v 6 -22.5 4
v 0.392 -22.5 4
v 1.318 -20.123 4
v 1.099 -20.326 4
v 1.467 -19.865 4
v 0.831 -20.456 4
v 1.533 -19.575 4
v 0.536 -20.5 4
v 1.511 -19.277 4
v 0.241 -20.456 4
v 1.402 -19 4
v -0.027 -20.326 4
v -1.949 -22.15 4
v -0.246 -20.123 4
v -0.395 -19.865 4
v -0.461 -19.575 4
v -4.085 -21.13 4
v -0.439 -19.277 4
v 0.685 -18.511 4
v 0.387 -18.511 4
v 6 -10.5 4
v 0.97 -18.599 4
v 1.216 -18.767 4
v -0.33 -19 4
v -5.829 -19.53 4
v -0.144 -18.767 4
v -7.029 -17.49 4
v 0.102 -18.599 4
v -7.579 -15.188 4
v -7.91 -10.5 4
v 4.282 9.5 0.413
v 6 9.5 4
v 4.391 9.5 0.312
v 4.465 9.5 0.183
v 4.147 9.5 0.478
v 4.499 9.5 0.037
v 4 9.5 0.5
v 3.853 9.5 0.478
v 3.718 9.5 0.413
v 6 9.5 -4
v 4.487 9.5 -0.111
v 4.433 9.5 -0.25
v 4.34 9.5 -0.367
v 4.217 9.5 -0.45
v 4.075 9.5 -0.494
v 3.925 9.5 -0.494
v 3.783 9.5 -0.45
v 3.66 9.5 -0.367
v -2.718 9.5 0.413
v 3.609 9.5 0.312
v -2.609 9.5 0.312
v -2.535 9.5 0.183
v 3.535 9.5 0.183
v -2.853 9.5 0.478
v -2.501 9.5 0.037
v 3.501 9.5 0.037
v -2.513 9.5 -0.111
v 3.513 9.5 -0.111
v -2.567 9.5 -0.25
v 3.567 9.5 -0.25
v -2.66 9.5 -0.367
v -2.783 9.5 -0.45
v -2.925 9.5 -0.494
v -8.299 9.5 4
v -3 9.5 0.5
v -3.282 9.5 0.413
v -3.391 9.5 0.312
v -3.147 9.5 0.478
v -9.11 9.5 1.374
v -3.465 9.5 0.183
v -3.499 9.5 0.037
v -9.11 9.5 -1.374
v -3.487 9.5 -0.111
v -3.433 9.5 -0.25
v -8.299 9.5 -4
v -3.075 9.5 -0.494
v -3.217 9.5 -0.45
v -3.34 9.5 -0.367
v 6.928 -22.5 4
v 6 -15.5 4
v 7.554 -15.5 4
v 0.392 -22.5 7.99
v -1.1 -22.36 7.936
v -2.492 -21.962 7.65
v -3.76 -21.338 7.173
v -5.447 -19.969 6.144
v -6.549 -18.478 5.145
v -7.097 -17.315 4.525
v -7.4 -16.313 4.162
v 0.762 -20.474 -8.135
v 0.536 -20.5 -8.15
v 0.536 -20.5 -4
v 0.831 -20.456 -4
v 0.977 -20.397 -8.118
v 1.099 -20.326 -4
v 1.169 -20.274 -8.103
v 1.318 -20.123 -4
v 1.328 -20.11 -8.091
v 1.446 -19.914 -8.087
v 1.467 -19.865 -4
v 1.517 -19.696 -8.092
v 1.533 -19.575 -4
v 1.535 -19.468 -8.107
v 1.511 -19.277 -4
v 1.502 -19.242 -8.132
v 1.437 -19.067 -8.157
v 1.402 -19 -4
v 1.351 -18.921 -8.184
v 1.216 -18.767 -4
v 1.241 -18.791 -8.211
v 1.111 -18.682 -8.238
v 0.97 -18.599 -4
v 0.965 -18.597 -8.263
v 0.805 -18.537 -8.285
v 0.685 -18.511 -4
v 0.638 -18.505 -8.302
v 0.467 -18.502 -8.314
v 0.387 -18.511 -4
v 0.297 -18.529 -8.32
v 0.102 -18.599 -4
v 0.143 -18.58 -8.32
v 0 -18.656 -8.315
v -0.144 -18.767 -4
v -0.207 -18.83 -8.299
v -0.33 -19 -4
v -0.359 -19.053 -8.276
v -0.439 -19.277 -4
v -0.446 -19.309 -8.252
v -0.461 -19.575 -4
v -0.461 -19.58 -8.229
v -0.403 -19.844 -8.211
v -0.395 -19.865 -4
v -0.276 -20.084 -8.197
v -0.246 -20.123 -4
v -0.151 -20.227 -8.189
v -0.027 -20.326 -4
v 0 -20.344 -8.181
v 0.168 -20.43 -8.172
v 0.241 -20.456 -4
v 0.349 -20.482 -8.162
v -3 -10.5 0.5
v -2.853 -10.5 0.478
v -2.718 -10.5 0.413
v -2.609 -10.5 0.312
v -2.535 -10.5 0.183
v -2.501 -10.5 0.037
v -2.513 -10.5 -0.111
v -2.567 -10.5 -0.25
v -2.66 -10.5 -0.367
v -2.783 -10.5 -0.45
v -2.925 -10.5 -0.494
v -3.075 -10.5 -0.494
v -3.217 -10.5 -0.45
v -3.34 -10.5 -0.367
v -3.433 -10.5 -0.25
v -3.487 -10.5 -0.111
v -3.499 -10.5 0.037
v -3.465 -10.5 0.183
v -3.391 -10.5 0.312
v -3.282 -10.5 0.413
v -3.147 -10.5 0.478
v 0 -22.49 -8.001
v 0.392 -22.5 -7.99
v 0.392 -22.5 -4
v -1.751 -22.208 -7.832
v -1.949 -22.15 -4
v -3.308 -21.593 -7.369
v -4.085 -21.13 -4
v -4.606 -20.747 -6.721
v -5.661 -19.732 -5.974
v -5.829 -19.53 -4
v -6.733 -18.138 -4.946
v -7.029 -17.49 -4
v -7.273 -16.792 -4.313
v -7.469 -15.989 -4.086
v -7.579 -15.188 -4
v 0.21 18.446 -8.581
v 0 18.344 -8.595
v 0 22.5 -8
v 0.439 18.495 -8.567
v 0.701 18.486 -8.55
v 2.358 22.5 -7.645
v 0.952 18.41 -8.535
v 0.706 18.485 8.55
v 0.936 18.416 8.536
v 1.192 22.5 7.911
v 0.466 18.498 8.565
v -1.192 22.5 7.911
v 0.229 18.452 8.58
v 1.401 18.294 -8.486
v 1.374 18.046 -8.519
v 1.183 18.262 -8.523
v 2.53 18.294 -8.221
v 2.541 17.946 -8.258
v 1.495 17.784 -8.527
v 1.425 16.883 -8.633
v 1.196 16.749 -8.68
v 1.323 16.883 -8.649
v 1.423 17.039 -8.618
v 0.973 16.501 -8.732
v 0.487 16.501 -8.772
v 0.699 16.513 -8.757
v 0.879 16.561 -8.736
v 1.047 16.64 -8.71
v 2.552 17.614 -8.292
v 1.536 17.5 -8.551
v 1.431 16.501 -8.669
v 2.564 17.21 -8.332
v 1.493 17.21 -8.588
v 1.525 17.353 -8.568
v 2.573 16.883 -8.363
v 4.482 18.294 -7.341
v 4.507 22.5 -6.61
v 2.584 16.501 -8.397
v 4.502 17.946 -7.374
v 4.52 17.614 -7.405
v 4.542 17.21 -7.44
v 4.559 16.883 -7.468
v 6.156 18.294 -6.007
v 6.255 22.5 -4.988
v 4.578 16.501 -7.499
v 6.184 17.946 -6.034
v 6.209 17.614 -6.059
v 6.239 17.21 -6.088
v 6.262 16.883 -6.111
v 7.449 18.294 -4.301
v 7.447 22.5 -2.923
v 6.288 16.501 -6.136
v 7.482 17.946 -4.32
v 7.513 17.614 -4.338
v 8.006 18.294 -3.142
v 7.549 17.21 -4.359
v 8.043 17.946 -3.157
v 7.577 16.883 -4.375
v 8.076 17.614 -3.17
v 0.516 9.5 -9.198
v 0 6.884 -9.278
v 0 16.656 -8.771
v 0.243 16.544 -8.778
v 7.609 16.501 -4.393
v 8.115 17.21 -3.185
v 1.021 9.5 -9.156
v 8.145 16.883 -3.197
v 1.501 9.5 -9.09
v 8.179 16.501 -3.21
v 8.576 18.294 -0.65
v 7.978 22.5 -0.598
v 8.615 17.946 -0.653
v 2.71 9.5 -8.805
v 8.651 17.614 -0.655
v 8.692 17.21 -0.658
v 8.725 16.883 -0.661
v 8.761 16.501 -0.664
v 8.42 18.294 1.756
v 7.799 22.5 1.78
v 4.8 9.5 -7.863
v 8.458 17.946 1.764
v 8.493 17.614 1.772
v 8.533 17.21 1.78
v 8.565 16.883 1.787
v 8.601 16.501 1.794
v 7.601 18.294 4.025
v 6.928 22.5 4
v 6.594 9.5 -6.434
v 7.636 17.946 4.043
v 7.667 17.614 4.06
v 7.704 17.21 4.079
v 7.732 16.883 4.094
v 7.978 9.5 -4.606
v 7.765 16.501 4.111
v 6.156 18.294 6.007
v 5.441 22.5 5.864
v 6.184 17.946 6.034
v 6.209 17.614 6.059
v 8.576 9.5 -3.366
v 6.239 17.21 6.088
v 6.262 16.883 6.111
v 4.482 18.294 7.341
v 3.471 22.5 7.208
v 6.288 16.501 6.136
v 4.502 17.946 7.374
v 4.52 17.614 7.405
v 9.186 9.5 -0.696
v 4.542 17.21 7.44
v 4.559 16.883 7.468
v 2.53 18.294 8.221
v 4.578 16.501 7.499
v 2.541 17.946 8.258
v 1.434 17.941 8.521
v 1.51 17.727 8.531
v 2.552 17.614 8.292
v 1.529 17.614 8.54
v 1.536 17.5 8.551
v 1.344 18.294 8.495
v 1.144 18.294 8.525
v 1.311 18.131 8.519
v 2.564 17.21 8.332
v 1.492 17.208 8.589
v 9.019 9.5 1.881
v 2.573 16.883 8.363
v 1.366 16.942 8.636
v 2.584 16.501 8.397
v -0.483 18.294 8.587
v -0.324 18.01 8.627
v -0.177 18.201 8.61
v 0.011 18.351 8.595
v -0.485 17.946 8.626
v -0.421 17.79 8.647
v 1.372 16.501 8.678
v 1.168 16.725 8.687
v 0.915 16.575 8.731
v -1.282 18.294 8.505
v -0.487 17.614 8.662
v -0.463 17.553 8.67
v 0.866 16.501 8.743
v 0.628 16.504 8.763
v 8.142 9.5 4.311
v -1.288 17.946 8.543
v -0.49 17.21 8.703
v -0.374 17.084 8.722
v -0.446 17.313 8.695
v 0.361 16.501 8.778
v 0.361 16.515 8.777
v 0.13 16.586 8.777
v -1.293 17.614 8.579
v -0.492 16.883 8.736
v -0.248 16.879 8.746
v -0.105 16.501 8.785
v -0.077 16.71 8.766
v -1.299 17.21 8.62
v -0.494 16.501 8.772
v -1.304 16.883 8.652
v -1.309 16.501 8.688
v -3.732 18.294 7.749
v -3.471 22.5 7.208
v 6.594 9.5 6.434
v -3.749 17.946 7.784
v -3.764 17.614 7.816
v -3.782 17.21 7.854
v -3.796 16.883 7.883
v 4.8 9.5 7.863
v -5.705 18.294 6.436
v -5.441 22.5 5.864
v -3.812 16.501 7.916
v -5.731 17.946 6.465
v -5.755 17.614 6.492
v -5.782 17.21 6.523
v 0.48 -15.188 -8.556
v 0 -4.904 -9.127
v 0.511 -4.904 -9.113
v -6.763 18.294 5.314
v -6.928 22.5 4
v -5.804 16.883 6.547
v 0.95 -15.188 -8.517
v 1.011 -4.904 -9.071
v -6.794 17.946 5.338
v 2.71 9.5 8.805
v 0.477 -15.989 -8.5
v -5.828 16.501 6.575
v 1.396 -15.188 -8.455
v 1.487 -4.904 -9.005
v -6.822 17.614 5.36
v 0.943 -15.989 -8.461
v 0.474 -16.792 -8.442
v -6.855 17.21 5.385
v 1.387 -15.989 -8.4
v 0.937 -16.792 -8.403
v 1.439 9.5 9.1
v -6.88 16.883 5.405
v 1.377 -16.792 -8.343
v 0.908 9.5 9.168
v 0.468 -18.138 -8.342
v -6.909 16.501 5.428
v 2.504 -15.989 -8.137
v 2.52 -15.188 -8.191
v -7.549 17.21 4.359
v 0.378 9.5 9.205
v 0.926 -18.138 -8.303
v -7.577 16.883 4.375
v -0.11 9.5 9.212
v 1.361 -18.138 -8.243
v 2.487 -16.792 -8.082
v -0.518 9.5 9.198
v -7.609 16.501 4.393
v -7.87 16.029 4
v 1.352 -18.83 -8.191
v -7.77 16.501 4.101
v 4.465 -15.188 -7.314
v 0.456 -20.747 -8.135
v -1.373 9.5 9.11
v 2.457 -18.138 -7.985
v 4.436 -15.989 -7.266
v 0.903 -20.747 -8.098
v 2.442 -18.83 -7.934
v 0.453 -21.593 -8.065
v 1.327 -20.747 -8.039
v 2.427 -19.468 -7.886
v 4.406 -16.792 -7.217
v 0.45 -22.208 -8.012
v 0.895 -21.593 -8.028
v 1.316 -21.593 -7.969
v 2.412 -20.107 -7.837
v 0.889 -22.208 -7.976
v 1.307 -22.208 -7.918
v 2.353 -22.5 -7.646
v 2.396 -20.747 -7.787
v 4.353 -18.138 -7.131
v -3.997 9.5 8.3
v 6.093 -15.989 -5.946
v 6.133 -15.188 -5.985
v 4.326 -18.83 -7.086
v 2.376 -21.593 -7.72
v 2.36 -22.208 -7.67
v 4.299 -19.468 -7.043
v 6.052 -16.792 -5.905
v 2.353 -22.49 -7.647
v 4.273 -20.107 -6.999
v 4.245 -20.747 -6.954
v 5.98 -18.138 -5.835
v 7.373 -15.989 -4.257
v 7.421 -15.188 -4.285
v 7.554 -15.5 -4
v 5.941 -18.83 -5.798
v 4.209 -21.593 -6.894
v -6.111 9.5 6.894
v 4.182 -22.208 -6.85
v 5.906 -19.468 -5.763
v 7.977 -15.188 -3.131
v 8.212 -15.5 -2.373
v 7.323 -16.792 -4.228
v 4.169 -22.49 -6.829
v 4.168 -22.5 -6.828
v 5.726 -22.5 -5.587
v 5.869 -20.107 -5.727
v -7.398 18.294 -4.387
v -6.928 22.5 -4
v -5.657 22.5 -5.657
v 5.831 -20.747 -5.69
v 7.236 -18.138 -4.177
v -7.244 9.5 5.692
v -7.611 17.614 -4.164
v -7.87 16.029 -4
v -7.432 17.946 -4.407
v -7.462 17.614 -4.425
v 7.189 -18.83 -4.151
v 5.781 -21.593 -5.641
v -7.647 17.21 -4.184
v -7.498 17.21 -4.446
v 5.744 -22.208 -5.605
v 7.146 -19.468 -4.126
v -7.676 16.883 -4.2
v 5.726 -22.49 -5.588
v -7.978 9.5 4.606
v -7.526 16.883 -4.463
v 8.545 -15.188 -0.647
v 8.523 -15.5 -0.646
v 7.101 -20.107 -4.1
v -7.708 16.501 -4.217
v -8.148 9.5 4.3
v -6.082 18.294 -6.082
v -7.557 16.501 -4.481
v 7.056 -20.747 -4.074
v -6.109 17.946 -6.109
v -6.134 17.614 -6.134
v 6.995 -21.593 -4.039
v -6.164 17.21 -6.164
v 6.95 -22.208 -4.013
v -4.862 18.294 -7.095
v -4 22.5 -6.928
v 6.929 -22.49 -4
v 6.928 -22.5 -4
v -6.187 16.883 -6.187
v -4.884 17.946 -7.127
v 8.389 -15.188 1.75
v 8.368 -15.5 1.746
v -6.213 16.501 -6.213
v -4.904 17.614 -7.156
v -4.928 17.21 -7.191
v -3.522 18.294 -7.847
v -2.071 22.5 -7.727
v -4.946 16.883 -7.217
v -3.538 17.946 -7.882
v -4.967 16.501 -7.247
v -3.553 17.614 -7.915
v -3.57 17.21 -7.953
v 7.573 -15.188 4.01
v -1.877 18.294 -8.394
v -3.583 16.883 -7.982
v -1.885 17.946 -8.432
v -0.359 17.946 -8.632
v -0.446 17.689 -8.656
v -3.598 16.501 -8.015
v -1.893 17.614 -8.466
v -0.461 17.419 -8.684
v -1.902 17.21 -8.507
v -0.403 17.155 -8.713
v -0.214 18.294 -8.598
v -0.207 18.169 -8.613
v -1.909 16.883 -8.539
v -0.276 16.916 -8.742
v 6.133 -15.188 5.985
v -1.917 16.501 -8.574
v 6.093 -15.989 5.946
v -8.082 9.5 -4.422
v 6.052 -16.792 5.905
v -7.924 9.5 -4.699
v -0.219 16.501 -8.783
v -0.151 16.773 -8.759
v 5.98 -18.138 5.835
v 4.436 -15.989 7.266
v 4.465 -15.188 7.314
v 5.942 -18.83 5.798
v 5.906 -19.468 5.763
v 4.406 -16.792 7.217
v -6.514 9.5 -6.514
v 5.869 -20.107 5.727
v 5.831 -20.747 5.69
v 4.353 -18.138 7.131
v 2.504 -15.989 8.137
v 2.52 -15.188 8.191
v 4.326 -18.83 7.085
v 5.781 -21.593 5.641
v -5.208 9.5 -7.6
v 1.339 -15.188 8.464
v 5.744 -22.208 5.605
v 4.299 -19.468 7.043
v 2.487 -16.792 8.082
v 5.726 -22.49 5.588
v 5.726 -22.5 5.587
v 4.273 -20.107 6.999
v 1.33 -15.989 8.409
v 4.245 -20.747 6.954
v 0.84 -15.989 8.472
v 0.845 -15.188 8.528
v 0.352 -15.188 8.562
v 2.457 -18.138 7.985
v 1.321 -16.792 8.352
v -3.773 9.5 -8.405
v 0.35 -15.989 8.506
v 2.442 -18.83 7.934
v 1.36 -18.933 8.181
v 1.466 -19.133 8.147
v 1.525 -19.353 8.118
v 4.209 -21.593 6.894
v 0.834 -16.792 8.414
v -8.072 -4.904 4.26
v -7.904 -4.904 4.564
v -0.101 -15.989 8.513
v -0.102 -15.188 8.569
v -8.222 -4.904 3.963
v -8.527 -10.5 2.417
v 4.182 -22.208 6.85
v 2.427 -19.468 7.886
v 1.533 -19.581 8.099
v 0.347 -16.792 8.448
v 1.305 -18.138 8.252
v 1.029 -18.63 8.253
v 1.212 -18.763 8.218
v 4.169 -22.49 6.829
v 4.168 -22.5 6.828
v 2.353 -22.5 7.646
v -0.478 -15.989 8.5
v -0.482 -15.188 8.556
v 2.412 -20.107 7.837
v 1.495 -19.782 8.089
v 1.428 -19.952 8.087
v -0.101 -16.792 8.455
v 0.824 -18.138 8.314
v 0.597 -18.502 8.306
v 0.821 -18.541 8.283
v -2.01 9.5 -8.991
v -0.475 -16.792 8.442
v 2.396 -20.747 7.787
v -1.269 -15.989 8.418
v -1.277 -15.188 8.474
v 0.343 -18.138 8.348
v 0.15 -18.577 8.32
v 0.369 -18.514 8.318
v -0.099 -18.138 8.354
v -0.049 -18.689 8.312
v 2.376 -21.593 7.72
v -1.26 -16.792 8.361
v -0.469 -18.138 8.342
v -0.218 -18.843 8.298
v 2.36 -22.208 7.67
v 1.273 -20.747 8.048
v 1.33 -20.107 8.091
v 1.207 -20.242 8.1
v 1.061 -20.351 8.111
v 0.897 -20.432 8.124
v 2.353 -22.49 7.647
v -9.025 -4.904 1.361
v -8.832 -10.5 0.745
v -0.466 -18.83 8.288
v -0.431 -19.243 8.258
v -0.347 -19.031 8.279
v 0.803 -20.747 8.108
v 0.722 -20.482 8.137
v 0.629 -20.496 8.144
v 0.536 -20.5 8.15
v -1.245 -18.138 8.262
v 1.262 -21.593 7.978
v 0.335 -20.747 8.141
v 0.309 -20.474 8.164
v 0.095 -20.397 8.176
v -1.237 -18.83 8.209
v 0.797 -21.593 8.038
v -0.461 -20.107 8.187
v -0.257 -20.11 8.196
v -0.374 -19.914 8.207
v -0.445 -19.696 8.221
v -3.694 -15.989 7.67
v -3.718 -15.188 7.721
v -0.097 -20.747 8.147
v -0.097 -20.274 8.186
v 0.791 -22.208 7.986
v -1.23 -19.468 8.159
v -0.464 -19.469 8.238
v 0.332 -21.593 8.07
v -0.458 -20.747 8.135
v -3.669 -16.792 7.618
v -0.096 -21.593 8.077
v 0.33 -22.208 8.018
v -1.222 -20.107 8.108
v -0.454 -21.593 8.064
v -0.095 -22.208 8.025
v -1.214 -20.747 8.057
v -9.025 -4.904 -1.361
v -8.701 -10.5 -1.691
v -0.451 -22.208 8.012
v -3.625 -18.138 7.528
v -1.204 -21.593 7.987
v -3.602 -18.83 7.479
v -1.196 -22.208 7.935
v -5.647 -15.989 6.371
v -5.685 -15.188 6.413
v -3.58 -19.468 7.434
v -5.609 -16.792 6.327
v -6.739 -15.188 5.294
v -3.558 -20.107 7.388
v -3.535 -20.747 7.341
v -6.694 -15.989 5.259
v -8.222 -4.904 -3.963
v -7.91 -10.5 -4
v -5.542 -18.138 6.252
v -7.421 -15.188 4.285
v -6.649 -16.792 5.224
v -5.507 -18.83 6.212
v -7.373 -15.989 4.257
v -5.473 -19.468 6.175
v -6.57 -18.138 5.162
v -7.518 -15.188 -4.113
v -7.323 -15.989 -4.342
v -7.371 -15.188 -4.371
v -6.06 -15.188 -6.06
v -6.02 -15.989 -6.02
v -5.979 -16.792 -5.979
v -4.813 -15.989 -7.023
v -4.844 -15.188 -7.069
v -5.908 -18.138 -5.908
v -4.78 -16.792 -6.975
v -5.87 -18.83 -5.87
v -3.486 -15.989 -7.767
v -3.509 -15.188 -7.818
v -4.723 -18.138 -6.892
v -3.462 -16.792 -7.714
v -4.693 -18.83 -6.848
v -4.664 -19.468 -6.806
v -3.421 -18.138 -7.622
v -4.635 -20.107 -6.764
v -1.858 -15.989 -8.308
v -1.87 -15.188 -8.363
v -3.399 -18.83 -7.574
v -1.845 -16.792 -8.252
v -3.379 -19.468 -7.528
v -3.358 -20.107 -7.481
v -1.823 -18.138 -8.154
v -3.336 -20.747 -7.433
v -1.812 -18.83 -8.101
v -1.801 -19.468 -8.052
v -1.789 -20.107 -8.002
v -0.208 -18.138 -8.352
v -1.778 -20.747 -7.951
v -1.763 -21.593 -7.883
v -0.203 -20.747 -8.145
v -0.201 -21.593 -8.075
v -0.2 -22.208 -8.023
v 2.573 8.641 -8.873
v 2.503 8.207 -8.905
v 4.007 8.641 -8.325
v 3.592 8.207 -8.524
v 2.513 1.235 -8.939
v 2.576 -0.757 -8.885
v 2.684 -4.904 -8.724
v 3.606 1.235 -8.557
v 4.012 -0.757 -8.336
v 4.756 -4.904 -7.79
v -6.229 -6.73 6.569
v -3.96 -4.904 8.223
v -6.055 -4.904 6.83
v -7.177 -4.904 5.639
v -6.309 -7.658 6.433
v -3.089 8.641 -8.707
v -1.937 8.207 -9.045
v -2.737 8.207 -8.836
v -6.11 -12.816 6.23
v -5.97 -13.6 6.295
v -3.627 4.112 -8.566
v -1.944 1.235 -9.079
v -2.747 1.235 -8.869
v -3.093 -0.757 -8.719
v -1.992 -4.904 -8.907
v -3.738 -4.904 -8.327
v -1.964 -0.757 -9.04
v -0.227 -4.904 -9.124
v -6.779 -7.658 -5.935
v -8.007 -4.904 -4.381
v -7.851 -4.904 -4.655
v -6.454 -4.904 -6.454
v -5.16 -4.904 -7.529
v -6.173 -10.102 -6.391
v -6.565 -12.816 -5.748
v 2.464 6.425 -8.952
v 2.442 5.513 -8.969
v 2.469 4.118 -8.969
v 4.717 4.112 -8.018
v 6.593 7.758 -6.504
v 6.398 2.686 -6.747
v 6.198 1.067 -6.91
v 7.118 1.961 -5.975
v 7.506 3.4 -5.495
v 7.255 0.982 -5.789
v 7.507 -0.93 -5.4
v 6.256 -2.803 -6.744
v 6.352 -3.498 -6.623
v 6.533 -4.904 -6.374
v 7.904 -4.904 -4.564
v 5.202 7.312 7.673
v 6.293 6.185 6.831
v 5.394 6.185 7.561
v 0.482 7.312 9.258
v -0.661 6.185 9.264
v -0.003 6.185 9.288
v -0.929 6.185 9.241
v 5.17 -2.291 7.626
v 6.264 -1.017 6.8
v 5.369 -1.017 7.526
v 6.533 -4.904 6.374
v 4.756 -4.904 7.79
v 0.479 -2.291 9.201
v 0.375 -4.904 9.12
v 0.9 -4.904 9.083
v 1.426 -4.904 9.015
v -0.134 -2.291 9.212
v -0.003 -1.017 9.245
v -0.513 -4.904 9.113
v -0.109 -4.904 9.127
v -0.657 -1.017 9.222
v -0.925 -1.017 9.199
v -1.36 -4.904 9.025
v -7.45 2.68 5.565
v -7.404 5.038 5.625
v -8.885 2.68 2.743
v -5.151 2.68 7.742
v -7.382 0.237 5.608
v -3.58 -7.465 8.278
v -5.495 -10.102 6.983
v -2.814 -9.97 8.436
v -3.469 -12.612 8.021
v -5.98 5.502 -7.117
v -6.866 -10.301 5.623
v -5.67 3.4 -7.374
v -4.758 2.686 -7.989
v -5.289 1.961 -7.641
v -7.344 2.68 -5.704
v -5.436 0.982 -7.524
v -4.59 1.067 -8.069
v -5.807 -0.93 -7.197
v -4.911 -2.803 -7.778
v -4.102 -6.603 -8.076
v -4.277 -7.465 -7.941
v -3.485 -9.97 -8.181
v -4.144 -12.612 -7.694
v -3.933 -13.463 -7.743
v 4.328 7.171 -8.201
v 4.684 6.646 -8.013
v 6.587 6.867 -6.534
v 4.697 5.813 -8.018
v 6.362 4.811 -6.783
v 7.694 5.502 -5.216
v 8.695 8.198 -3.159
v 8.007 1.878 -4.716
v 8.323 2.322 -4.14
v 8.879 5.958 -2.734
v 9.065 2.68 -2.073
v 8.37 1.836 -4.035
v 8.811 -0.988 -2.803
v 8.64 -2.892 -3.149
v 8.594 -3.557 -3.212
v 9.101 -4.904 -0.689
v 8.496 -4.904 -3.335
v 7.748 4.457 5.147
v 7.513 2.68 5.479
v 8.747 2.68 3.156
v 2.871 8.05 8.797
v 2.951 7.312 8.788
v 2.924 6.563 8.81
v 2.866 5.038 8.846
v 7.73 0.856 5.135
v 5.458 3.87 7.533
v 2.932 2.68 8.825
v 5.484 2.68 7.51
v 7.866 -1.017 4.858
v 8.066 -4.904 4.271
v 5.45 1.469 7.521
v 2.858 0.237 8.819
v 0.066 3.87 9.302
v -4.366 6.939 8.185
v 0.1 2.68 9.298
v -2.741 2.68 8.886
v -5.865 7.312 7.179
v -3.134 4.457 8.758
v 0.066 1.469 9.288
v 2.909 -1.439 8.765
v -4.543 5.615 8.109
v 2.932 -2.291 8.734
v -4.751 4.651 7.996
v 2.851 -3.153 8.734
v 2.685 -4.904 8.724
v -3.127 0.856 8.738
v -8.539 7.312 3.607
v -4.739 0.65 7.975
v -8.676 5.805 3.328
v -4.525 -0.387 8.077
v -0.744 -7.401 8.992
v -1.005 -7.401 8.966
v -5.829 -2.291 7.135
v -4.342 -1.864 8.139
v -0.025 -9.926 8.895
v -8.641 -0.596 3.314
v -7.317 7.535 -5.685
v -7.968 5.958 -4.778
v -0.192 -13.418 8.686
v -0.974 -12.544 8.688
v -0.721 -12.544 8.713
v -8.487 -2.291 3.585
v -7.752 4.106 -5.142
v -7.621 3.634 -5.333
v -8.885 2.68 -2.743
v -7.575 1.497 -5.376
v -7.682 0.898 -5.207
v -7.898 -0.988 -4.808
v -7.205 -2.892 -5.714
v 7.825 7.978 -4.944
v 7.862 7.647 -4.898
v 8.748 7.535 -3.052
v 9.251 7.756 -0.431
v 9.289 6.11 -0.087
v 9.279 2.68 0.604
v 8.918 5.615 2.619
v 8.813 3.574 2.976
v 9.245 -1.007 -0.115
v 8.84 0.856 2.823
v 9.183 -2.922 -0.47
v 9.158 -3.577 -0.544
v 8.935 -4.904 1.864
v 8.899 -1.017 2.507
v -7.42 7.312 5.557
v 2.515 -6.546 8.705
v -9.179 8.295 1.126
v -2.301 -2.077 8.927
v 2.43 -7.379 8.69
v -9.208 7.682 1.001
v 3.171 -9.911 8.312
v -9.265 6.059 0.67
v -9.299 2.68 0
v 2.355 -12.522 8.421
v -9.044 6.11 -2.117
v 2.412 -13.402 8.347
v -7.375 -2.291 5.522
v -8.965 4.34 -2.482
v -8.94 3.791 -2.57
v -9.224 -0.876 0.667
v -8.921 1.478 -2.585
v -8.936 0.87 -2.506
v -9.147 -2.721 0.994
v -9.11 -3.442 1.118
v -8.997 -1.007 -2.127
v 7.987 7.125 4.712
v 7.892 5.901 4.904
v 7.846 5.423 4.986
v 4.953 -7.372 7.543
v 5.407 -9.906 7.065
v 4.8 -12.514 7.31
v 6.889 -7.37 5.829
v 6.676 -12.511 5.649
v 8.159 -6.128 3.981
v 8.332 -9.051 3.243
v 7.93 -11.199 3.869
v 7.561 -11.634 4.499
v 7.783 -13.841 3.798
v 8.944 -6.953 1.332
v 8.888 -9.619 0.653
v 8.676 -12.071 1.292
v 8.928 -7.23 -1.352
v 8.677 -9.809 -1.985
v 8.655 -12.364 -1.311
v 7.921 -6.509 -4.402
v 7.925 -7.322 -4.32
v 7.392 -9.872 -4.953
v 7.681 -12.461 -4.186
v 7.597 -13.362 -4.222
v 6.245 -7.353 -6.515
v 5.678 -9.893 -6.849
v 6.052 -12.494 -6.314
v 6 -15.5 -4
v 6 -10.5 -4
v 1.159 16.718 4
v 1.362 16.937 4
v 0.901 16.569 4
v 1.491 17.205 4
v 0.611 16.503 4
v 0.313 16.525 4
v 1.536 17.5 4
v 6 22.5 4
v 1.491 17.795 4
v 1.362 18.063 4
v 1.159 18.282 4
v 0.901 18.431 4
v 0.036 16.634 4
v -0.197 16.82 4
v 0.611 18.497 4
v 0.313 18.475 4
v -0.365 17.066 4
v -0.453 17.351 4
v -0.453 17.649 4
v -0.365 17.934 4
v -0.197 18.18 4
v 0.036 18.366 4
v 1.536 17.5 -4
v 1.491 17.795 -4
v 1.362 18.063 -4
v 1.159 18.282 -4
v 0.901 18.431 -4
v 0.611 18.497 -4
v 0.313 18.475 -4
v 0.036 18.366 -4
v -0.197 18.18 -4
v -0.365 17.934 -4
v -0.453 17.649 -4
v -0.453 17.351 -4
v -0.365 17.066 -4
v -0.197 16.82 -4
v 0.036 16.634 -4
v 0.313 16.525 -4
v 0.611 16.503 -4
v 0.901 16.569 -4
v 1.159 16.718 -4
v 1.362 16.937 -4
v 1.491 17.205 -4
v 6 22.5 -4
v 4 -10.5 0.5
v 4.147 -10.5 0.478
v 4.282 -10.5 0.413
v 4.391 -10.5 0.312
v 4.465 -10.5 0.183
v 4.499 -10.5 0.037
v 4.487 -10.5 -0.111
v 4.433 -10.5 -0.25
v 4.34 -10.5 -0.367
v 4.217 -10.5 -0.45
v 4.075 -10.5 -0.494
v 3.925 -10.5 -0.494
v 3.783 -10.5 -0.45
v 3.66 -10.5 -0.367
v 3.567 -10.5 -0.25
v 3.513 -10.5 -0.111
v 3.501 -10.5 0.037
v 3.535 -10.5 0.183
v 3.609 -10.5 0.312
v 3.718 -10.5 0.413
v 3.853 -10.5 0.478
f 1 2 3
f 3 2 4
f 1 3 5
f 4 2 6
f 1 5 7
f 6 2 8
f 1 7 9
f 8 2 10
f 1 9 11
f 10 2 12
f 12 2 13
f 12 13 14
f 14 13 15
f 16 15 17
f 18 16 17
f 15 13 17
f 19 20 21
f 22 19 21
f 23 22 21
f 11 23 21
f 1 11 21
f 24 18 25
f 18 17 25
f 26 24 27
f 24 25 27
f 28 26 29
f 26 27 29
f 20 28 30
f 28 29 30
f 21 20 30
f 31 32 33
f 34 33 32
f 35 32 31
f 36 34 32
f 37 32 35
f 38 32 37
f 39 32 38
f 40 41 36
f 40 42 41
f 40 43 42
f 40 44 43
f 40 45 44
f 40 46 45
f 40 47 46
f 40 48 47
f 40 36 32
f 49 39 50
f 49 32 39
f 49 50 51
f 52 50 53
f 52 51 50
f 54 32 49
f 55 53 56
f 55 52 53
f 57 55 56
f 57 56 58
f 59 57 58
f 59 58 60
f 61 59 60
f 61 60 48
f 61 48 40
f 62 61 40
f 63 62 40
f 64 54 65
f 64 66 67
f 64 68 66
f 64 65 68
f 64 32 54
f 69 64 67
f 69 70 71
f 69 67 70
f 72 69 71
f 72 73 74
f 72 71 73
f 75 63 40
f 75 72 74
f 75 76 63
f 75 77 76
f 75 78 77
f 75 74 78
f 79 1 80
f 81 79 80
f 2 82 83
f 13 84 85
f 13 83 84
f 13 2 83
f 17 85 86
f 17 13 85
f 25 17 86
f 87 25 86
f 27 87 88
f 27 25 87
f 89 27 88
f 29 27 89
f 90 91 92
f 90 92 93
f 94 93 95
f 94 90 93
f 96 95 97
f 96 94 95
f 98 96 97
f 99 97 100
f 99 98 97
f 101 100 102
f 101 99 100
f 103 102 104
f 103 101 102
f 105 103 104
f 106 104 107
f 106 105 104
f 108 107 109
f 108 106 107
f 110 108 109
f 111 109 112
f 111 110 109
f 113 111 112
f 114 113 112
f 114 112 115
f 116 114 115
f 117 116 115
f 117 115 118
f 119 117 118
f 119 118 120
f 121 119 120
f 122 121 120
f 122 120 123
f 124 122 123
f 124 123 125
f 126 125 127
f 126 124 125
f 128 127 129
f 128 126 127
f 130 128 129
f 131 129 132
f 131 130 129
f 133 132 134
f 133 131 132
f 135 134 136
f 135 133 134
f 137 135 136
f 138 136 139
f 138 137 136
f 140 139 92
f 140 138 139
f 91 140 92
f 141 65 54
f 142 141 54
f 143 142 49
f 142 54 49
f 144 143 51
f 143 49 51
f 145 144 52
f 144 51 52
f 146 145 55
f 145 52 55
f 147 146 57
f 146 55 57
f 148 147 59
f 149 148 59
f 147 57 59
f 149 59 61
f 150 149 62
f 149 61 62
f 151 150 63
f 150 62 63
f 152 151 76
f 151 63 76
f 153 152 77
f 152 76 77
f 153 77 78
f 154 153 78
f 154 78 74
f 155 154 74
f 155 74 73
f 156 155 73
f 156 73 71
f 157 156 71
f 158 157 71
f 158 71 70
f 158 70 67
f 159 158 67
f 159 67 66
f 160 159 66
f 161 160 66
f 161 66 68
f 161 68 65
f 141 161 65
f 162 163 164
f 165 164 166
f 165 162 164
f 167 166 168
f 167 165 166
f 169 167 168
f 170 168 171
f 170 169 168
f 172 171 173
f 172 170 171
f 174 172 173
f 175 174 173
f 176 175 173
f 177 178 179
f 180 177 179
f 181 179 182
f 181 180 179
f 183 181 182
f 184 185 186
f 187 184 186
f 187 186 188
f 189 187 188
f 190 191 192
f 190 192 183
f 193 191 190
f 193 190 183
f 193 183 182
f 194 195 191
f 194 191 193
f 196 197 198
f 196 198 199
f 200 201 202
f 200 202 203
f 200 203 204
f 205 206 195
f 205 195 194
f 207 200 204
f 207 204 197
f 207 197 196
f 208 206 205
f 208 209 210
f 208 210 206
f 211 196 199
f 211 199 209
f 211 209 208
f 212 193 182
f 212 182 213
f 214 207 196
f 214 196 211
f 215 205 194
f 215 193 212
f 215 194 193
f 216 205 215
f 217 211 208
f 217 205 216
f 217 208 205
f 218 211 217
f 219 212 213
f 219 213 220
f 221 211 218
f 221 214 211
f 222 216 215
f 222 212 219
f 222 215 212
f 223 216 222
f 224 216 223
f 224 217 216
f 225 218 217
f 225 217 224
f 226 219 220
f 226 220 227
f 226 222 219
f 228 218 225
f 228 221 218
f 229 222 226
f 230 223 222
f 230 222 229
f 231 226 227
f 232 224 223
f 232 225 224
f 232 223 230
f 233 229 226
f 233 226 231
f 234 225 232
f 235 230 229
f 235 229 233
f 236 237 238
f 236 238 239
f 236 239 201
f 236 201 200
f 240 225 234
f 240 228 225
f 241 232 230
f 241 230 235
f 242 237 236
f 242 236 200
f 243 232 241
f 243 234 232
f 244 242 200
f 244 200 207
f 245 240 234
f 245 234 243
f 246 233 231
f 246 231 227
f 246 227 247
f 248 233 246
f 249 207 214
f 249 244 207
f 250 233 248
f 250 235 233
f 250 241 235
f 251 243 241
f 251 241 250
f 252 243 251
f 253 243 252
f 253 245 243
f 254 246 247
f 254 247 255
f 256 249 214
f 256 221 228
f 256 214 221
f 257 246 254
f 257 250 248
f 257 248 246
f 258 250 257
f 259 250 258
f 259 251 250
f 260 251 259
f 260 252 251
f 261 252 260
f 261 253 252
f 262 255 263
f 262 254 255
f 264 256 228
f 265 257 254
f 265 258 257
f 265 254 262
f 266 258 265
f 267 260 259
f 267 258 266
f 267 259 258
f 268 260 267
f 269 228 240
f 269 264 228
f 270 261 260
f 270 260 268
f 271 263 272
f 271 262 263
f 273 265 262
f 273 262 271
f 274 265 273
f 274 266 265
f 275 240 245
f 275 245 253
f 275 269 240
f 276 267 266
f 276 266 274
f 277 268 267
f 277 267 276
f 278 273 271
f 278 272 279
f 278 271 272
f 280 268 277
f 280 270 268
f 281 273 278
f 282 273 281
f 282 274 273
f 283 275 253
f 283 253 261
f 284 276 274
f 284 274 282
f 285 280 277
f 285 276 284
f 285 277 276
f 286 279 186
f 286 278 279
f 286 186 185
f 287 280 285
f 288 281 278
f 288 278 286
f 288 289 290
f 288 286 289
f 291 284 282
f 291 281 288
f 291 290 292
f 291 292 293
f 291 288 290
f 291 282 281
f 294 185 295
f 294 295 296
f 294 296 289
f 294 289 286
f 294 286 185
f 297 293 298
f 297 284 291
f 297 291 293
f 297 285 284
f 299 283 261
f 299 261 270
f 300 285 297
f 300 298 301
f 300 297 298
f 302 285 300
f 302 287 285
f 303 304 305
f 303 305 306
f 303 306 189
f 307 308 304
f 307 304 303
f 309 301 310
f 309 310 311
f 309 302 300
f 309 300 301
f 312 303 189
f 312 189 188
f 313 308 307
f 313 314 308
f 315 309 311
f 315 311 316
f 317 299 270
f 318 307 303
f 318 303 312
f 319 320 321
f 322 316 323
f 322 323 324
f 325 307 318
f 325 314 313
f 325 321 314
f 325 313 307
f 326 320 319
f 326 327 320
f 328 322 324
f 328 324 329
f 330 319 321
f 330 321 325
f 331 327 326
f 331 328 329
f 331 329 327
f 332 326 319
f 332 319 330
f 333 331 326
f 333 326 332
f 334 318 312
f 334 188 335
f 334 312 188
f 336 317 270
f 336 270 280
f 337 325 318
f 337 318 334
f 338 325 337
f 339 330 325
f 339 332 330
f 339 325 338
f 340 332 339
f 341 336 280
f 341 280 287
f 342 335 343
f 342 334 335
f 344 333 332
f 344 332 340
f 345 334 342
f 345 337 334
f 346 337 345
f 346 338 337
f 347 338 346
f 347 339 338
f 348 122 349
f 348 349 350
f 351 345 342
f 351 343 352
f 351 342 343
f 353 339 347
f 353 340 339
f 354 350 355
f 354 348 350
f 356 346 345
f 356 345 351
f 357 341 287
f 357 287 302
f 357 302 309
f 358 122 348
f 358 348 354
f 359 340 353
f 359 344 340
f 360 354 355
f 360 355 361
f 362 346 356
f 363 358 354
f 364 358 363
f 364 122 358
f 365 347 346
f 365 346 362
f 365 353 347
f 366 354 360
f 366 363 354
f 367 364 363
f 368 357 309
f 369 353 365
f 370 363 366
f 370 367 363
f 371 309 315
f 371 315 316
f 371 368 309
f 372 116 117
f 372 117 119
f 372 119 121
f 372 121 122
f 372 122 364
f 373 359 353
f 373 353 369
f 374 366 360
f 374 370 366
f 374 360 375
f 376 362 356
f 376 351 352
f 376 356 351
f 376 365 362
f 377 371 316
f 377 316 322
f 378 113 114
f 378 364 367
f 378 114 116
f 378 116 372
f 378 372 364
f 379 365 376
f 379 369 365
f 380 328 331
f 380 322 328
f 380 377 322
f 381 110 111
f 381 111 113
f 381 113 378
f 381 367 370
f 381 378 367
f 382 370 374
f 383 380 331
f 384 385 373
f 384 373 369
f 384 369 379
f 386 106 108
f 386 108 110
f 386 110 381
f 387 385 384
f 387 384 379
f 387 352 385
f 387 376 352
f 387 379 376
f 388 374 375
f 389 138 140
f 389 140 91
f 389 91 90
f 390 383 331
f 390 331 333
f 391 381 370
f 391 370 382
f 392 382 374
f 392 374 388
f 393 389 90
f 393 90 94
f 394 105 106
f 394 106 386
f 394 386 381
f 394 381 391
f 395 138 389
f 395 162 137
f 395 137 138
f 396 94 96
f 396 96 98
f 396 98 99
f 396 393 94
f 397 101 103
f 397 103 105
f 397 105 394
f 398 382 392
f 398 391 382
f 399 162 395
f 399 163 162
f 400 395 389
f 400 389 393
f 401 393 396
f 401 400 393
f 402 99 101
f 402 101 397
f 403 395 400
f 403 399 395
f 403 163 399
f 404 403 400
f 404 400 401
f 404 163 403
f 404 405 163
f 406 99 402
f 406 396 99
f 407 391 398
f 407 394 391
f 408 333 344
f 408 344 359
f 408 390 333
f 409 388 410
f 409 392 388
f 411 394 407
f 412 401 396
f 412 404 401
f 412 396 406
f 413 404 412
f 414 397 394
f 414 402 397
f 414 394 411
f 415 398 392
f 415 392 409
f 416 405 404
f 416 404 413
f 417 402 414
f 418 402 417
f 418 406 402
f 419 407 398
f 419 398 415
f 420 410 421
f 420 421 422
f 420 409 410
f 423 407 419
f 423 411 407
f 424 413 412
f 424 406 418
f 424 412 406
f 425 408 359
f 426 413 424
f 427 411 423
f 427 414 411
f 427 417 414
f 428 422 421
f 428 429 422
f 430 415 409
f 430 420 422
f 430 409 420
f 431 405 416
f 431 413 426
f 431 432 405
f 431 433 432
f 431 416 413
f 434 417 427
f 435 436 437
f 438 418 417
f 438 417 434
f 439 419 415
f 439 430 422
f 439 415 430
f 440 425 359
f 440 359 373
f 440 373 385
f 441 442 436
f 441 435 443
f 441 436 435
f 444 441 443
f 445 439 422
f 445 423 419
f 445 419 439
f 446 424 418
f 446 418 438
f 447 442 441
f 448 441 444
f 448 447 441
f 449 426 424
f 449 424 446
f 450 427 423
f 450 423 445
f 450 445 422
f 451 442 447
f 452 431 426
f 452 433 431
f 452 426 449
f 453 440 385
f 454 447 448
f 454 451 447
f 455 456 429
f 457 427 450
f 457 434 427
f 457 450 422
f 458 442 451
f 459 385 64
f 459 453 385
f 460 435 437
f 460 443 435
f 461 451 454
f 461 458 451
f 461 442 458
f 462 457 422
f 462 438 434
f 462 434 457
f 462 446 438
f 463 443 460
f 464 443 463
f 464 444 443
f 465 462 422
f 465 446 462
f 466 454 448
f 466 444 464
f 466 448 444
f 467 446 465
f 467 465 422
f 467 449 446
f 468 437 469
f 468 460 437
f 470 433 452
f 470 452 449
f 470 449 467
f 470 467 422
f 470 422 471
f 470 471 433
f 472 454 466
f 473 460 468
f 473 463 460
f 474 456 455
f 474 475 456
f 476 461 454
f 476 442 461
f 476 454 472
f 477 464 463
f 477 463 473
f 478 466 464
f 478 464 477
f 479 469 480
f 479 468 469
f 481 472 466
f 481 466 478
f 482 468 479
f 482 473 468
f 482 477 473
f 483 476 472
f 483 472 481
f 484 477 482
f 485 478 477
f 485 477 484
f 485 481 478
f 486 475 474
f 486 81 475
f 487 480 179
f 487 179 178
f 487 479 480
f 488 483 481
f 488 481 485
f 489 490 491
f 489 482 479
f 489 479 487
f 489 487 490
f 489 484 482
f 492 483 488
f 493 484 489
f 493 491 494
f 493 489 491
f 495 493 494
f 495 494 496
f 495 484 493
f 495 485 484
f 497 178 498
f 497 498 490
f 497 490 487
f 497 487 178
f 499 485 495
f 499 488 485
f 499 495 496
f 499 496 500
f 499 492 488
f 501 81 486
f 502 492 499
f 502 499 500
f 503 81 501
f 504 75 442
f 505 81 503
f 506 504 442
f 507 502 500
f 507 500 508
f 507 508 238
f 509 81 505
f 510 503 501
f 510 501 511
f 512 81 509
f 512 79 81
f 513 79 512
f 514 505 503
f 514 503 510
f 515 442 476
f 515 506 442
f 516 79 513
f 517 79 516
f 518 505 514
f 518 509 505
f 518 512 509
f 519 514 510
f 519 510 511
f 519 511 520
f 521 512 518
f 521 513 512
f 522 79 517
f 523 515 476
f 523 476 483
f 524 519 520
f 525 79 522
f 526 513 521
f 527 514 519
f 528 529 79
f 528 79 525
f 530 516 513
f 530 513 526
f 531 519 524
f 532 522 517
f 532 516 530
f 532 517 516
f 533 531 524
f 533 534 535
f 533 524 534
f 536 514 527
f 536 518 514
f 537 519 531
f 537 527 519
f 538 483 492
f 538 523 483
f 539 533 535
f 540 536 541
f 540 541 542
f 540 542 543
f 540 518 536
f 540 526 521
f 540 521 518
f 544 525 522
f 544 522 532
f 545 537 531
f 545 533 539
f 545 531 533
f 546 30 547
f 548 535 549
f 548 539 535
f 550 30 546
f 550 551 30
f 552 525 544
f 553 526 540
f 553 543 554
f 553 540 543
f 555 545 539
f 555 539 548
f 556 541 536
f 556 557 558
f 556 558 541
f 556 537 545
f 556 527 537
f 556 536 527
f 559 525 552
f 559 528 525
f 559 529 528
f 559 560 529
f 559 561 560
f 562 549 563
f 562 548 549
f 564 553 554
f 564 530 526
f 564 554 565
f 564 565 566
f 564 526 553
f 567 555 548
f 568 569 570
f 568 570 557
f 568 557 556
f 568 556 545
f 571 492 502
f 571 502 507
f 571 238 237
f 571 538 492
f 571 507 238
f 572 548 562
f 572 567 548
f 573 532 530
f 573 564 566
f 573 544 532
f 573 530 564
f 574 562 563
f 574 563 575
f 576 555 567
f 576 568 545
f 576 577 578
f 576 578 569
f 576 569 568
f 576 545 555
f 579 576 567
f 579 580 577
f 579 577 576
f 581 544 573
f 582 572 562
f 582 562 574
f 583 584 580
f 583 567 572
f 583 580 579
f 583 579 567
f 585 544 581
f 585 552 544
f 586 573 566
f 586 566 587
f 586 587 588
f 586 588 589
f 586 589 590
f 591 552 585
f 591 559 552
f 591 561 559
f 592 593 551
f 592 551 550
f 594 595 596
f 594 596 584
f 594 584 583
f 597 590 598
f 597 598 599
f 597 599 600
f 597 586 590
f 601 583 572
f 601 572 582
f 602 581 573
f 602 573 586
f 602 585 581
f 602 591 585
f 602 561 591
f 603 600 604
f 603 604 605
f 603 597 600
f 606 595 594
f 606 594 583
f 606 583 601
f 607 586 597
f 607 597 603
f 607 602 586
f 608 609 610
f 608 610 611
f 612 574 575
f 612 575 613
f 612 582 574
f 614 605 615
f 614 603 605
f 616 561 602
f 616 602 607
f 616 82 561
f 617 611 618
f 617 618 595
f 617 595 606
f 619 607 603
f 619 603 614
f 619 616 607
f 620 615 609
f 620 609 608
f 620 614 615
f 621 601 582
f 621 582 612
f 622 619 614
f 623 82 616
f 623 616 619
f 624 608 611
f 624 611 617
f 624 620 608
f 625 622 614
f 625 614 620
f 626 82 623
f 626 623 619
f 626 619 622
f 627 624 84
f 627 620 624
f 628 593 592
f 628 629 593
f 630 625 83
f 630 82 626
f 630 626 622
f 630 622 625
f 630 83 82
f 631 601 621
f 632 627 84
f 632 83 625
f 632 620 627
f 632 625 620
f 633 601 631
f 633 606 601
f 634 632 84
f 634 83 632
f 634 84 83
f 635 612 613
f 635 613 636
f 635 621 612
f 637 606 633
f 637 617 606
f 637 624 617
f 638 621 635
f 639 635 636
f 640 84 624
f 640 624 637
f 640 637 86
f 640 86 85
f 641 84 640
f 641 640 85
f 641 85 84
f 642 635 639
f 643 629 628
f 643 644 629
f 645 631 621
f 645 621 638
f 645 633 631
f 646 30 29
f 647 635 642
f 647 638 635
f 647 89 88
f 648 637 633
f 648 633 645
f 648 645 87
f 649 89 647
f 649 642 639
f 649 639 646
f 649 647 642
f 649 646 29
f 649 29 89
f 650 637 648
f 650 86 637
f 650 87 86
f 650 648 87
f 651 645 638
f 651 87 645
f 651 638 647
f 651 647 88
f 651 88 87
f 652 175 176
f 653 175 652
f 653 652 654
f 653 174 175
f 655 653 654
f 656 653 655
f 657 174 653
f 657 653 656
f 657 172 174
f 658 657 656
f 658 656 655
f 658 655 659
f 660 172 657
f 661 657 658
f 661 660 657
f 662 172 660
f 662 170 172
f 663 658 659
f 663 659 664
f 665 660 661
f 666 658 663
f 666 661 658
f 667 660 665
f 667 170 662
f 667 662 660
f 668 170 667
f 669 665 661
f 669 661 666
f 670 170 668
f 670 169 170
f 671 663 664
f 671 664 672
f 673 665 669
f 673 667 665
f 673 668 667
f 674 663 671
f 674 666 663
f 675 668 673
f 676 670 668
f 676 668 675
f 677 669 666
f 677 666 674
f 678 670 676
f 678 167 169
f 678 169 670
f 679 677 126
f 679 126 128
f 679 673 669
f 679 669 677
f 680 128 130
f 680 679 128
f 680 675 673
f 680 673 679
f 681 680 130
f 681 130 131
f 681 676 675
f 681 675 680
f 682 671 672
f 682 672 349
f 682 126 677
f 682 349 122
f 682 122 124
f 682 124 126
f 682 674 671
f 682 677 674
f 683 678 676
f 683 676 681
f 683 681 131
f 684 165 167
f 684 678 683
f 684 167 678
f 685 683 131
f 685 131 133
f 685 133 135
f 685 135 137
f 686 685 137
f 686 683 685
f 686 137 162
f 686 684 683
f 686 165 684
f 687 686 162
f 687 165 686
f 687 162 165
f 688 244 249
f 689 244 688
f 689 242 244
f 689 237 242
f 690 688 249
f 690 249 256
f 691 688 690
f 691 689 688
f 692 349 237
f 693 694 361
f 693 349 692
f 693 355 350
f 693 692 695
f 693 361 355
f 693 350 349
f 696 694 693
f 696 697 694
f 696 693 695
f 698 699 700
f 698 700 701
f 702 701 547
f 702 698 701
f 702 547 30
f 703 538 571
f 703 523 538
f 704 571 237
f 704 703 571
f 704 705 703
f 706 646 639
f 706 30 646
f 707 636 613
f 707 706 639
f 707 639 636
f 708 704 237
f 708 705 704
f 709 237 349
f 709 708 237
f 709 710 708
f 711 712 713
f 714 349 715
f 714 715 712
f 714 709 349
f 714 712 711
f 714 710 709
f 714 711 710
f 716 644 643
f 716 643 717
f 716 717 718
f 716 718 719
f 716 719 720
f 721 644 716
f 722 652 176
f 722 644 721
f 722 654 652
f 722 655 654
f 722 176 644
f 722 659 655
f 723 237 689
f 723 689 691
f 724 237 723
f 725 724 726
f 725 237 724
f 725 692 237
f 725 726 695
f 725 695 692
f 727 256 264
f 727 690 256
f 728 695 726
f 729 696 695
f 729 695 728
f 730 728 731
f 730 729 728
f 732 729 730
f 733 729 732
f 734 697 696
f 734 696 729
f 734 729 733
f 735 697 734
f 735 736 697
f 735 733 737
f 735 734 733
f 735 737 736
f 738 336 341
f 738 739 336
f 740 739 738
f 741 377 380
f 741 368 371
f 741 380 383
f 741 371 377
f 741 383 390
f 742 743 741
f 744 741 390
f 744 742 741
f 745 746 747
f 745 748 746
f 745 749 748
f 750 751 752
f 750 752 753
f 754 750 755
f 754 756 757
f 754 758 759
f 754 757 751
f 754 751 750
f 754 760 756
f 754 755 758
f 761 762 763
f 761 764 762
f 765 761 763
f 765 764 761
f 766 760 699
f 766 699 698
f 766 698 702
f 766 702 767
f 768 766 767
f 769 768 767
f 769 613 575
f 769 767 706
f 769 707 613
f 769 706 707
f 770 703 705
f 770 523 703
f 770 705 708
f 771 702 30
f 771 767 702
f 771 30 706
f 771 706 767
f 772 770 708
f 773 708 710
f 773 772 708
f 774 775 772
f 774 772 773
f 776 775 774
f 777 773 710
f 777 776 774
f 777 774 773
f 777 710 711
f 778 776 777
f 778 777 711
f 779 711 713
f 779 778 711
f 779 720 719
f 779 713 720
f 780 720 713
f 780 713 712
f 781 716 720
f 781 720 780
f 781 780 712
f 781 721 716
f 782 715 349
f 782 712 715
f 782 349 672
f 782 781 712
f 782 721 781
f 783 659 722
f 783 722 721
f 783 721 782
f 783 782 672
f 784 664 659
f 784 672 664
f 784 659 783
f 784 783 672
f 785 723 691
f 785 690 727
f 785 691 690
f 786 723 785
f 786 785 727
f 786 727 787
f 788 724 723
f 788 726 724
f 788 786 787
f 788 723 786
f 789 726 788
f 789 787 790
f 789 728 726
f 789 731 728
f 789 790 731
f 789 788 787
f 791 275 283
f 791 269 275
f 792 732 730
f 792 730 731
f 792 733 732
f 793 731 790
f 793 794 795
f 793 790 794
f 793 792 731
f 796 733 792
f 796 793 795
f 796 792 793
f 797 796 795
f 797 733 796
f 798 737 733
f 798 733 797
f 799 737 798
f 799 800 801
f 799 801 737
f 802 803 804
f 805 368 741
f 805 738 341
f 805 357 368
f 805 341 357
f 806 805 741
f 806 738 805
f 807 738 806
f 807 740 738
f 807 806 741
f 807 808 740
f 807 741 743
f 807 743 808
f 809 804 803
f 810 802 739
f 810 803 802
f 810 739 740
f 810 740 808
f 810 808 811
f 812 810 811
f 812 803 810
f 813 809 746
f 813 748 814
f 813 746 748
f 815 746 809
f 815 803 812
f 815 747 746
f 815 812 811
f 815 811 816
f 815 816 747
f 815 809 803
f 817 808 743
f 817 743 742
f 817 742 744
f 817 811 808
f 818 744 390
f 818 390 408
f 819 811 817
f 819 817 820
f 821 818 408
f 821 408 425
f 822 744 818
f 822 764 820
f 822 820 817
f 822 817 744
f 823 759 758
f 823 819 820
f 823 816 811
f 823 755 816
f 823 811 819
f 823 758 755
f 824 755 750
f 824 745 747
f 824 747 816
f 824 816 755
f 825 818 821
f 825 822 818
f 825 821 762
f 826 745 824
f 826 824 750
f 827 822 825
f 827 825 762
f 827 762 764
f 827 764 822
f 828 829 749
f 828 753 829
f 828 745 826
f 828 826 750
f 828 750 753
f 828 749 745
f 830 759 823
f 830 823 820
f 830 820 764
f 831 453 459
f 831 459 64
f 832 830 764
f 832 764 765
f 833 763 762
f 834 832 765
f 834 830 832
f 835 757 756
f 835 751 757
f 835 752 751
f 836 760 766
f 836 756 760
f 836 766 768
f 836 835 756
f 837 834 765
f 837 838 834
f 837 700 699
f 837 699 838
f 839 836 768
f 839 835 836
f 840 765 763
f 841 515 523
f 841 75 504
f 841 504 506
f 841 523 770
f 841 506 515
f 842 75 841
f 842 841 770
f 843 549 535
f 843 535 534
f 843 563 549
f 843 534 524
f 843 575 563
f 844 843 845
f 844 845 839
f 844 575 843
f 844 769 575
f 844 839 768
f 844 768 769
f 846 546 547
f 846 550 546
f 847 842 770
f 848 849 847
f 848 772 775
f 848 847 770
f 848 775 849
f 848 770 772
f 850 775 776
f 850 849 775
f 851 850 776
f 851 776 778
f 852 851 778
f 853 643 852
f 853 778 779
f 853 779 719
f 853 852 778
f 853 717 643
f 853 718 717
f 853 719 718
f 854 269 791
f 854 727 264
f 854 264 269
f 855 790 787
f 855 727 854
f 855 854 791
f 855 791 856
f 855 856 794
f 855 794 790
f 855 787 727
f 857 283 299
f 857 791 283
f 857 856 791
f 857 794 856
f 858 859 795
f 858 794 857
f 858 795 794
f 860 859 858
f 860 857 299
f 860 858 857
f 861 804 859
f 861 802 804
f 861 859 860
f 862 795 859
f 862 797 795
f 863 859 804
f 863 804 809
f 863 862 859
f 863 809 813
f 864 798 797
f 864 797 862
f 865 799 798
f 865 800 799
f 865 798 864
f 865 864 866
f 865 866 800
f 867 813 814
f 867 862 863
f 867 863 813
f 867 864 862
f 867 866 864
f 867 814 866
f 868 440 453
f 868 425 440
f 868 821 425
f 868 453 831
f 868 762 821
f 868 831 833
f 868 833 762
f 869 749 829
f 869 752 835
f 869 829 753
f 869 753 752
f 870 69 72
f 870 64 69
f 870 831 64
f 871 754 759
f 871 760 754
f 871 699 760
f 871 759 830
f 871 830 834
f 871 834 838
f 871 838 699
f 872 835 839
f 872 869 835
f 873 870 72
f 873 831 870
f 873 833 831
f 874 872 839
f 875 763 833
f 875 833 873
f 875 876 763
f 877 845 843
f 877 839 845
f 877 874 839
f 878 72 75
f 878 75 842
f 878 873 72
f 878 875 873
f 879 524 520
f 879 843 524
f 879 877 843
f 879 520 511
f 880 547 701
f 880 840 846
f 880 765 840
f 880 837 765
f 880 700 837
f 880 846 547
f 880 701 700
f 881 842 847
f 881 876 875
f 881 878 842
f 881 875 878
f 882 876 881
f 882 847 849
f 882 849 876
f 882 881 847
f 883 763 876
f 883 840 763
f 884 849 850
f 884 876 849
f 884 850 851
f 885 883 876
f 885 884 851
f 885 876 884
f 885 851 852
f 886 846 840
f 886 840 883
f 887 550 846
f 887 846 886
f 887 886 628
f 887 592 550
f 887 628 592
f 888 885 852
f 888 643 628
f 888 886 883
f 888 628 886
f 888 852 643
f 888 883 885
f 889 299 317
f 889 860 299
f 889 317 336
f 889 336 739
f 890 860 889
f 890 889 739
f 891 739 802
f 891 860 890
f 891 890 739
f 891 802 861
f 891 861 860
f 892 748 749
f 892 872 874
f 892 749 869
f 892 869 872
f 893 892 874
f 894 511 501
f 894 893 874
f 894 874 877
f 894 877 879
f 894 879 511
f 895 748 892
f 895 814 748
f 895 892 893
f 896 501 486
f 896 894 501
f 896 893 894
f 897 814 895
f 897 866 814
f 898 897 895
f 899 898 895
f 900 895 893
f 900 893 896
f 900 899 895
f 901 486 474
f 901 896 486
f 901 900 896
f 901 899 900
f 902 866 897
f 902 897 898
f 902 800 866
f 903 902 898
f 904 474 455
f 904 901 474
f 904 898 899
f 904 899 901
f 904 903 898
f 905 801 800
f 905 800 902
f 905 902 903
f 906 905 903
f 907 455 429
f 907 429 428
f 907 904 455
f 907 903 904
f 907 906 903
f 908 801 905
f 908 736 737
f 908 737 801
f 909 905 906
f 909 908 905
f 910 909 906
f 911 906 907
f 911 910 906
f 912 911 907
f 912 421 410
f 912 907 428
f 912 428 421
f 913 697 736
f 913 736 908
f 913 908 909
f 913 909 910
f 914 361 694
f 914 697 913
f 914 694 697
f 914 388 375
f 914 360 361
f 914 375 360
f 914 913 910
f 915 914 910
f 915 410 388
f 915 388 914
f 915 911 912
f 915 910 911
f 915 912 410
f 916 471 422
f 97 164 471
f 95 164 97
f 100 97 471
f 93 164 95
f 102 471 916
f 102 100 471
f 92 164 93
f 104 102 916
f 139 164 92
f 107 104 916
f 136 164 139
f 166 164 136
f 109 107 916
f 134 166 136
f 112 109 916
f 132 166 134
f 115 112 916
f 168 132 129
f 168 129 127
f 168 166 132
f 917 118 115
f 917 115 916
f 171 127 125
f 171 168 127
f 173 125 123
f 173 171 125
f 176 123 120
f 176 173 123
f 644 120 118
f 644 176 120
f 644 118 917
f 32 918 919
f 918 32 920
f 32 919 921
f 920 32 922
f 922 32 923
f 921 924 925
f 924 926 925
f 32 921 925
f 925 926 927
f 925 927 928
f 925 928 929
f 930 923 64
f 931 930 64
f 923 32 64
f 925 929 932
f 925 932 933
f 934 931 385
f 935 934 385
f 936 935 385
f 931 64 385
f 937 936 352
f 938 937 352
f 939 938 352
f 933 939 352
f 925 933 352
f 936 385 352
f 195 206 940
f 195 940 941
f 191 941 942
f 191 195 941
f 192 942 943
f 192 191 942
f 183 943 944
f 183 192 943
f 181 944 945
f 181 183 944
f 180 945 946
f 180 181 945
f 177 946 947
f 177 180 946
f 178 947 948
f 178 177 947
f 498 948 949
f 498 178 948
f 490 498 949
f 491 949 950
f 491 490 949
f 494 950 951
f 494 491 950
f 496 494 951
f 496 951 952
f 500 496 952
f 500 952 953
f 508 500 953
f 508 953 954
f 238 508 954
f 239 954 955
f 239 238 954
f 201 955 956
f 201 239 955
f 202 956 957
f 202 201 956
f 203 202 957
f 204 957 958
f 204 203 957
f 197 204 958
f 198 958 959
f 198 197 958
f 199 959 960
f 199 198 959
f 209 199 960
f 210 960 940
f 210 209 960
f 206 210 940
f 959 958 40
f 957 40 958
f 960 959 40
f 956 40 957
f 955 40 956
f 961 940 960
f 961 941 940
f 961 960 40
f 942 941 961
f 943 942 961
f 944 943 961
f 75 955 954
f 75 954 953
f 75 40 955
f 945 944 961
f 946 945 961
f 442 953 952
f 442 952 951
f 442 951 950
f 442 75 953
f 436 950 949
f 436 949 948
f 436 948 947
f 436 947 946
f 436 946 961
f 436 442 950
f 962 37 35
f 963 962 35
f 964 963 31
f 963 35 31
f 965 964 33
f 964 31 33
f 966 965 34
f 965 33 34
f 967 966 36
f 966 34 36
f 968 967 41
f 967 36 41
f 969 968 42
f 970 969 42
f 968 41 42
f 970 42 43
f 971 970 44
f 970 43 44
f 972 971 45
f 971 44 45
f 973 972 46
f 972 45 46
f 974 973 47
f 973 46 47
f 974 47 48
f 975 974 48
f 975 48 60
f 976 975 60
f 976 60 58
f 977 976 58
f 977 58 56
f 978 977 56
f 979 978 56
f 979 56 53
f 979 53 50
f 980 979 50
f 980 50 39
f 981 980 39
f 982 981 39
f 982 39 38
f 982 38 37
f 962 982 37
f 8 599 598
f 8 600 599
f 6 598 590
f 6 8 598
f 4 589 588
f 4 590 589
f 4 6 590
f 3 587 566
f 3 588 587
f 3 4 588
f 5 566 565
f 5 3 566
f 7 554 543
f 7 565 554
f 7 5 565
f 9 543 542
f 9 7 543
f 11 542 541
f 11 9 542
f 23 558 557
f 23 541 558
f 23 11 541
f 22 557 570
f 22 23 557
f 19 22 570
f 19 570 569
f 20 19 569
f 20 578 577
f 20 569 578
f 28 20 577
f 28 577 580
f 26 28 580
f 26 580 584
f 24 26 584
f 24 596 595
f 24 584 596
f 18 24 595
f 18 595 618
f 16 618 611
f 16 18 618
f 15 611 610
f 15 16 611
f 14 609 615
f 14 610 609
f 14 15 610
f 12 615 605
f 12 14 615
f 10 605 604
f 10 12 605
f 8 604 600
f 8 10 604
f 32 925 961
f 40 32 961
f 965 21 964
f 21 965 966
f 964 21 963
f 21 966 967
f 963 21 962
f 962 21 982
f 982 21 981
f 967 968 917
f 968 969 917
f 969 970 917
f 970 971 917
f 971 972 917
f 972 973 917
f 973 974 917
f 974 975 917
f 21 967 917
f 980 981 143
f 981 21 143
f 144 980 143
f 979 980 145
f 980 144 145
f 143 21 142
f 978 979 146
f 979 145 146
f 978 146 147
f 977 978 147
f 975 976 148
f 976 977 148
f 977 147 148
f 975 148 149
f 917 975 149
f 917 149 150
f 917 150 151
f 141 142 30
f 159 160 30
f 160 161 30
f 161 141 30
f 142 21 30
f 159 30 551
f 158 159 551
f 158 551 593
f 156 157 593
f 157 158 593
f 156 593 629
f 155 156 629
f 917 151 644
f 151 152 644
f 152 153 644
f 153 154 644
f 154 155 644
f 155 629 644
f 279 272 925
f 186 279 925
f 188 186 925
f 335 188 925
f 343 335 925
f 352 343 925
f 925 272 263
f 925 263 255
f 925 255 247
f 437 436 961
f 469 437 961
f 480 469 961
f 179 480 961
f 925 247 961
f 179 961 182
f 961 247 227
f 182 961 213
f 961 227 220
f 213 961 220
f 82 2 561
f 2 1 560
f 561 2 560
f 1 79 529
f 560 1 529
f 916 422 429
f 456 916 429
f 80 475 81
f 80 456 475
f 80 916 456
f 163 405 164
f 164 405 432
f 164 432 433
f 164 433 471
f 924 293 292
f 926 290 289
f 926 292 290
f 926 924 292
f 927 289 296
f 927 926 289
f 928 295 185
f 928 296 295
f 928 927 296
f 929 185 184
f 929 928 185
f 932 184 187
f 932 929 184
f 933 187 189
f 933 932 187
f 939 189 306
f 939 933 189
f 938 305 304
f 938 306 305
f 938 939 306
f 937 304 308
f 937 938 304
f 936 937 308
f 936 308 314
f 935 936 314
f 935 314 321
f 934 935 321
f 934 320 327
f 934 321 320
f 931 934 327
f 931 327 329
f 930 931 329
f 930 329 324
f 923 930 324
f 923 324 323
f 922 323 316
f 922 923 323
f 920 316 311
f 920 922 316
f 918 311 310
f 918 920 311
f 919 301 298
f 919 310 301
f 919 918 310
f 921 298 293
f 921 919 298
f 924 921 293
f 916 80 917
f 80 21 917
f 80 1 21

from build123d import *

# Parameters (mm, degrees)
CUT_EXTRUDE1_DEPTH      = 6
CUT_EXTRUDE1_DEPTH_BACK = 27.06372692
SKETCH2_W               = 8
SKETCH2_H               = 13
SKETCH2_H_2             = 12
CUT_EXTRUDE2_DEPTH      = 27.06372692
CUT_EXTRUDE2_DEPTH_BACK = 27.06372692
SKETCH3_R               = 1
CUT_EXTRUDE4_START      = 10
CUT_EXTRUDE4_DEPTH      = 20
SKETCH7_R               = 0.5
CUT_EXTRUDE5_DEPTH      = 35.598668513
SKETCH8_W               = 7.99991565
SKETCH8_H               = 7
CUT_EXTRUDE6_DEPTH      = 29.756672237


with BuildPart() as part:
    # Sketch1 → Revolve1 (revolve)
    with BuildSketch(Plane(origin=(0, 0, 0), x_dir=(0, 0, -1), z_dir=(1, 0, 0))):
        with BuildLine():
            Line((0, 22.5), (0, -22.5))
            Line((0, -22.5), (8, -22.5))
            add(Edge.make_bspline(
                [(8, 22.5), (10.604722665, 7.727883705), (8, -22.5)],
                knots=[0, 0, 0, 1, 1, 1], degree=2))
            Line((8, 22.5), (0, 22.5))
        make_face()
    revolve(axis=Axis((0, 22.5, 0), (0, -1, 0)))

    # Sketch2 → Cut-Extrude1 (cut, two sides: drawn at the far end of the back side and taken through both)
    with BuildSketch(Plane(origin=(0, 0, 0), x_dir=(0, 0, -1), z_dir=(1, 0, 0)).offset(-CUT_EXTRUDE1_DEPTH_BACK)):
        with Locations((0, 16)):
            Rectangle(SKETCH2_W, SKETCH2_H)
        with Locations((0, -16.5)):
            Rectangle(SKETCH2_W, SKETCH2_H_2)
    extrude(amount=CUT_EXTRUDE1_DEPTH + CUT_EXTRUDE1_DEPTH_BACK, mode=Mode.SUBTRACT)

    # Sketch3 → Cut-Extrude2 (cut, two sides: drawn at the far end of the back side and taken through both)
    with BuildSketch(Plane.XY.offset(-CUT_EXTRUDE2_DEPTH_BACK)):
        with Locations((0.535898385, 17.5)):
            Circle(SKETCH3_R)
        with Locations((0.535898385, -19.5)):
            Circle(SKETCH3_R)
    extrude(amount=CUT_EXTRUDE2_DEPTH + CUT_EXTRUDE2_DEPTH_BACK, mode=Mode.SUBTRACT)

    # Sketch5 → Cut-Extrude4 (cut)
    with BuildSketch(Plane.XY.offset(CUT_EXTRUDE4_START)):
        with BuildLine():
            add(Edge.make_bspline(
                [(-7.584243459, -15.120716805), (-7.392642157, -17.582692325), (-7.172739088, -20.042353376), (-6.92820323, -22.5)],
                knots=[0.384703821, 0.384703821, 0.384703821, 0.384703821, 1, 1, 1, 1], degree=3))
            Line((-6.92820323, -22.5), (0.391639605, -22.5))
            ThreePointArc((0.391639605, -22.5), (-5.041327612, -20.372211442), (-7.584243459, -15.120716805))
        make_face()
    extrude(amount=-CUT_EXTRUDE4_DEPTH, mode=Mode.SUBTRACT)

    # Sketch7 → Cut-Extrude5 (cut, through all)
    with BuildSketch(Plane(origin=(0, 9.5, 0), x_dir=(1, 0, 0), z_dir=(0, 1, 0))):
        with Locations((-3, 0)):
            Circle(SKETCH7_R)
        with Locations((4, 0)):
            Circle(SKETCH7_R)
    extrude(amount=-CUT_EXTRUDE5_DEPTH, mode=Mode.SUBTRACT)

    # Sketch8 → Cut-Extrude6 (cut, through all)
    with BuildSketch(Plane.ZY.offset(-6)):
        with Locations((-4.2175e-05, -19)):
            Rectangle(SKETCH8_W, SKETCH8_H)
    extrude(amount=-CUT_EXTRUDE6_DEPTH, mode=Mode.SUBTRACT)


solid = part.part
